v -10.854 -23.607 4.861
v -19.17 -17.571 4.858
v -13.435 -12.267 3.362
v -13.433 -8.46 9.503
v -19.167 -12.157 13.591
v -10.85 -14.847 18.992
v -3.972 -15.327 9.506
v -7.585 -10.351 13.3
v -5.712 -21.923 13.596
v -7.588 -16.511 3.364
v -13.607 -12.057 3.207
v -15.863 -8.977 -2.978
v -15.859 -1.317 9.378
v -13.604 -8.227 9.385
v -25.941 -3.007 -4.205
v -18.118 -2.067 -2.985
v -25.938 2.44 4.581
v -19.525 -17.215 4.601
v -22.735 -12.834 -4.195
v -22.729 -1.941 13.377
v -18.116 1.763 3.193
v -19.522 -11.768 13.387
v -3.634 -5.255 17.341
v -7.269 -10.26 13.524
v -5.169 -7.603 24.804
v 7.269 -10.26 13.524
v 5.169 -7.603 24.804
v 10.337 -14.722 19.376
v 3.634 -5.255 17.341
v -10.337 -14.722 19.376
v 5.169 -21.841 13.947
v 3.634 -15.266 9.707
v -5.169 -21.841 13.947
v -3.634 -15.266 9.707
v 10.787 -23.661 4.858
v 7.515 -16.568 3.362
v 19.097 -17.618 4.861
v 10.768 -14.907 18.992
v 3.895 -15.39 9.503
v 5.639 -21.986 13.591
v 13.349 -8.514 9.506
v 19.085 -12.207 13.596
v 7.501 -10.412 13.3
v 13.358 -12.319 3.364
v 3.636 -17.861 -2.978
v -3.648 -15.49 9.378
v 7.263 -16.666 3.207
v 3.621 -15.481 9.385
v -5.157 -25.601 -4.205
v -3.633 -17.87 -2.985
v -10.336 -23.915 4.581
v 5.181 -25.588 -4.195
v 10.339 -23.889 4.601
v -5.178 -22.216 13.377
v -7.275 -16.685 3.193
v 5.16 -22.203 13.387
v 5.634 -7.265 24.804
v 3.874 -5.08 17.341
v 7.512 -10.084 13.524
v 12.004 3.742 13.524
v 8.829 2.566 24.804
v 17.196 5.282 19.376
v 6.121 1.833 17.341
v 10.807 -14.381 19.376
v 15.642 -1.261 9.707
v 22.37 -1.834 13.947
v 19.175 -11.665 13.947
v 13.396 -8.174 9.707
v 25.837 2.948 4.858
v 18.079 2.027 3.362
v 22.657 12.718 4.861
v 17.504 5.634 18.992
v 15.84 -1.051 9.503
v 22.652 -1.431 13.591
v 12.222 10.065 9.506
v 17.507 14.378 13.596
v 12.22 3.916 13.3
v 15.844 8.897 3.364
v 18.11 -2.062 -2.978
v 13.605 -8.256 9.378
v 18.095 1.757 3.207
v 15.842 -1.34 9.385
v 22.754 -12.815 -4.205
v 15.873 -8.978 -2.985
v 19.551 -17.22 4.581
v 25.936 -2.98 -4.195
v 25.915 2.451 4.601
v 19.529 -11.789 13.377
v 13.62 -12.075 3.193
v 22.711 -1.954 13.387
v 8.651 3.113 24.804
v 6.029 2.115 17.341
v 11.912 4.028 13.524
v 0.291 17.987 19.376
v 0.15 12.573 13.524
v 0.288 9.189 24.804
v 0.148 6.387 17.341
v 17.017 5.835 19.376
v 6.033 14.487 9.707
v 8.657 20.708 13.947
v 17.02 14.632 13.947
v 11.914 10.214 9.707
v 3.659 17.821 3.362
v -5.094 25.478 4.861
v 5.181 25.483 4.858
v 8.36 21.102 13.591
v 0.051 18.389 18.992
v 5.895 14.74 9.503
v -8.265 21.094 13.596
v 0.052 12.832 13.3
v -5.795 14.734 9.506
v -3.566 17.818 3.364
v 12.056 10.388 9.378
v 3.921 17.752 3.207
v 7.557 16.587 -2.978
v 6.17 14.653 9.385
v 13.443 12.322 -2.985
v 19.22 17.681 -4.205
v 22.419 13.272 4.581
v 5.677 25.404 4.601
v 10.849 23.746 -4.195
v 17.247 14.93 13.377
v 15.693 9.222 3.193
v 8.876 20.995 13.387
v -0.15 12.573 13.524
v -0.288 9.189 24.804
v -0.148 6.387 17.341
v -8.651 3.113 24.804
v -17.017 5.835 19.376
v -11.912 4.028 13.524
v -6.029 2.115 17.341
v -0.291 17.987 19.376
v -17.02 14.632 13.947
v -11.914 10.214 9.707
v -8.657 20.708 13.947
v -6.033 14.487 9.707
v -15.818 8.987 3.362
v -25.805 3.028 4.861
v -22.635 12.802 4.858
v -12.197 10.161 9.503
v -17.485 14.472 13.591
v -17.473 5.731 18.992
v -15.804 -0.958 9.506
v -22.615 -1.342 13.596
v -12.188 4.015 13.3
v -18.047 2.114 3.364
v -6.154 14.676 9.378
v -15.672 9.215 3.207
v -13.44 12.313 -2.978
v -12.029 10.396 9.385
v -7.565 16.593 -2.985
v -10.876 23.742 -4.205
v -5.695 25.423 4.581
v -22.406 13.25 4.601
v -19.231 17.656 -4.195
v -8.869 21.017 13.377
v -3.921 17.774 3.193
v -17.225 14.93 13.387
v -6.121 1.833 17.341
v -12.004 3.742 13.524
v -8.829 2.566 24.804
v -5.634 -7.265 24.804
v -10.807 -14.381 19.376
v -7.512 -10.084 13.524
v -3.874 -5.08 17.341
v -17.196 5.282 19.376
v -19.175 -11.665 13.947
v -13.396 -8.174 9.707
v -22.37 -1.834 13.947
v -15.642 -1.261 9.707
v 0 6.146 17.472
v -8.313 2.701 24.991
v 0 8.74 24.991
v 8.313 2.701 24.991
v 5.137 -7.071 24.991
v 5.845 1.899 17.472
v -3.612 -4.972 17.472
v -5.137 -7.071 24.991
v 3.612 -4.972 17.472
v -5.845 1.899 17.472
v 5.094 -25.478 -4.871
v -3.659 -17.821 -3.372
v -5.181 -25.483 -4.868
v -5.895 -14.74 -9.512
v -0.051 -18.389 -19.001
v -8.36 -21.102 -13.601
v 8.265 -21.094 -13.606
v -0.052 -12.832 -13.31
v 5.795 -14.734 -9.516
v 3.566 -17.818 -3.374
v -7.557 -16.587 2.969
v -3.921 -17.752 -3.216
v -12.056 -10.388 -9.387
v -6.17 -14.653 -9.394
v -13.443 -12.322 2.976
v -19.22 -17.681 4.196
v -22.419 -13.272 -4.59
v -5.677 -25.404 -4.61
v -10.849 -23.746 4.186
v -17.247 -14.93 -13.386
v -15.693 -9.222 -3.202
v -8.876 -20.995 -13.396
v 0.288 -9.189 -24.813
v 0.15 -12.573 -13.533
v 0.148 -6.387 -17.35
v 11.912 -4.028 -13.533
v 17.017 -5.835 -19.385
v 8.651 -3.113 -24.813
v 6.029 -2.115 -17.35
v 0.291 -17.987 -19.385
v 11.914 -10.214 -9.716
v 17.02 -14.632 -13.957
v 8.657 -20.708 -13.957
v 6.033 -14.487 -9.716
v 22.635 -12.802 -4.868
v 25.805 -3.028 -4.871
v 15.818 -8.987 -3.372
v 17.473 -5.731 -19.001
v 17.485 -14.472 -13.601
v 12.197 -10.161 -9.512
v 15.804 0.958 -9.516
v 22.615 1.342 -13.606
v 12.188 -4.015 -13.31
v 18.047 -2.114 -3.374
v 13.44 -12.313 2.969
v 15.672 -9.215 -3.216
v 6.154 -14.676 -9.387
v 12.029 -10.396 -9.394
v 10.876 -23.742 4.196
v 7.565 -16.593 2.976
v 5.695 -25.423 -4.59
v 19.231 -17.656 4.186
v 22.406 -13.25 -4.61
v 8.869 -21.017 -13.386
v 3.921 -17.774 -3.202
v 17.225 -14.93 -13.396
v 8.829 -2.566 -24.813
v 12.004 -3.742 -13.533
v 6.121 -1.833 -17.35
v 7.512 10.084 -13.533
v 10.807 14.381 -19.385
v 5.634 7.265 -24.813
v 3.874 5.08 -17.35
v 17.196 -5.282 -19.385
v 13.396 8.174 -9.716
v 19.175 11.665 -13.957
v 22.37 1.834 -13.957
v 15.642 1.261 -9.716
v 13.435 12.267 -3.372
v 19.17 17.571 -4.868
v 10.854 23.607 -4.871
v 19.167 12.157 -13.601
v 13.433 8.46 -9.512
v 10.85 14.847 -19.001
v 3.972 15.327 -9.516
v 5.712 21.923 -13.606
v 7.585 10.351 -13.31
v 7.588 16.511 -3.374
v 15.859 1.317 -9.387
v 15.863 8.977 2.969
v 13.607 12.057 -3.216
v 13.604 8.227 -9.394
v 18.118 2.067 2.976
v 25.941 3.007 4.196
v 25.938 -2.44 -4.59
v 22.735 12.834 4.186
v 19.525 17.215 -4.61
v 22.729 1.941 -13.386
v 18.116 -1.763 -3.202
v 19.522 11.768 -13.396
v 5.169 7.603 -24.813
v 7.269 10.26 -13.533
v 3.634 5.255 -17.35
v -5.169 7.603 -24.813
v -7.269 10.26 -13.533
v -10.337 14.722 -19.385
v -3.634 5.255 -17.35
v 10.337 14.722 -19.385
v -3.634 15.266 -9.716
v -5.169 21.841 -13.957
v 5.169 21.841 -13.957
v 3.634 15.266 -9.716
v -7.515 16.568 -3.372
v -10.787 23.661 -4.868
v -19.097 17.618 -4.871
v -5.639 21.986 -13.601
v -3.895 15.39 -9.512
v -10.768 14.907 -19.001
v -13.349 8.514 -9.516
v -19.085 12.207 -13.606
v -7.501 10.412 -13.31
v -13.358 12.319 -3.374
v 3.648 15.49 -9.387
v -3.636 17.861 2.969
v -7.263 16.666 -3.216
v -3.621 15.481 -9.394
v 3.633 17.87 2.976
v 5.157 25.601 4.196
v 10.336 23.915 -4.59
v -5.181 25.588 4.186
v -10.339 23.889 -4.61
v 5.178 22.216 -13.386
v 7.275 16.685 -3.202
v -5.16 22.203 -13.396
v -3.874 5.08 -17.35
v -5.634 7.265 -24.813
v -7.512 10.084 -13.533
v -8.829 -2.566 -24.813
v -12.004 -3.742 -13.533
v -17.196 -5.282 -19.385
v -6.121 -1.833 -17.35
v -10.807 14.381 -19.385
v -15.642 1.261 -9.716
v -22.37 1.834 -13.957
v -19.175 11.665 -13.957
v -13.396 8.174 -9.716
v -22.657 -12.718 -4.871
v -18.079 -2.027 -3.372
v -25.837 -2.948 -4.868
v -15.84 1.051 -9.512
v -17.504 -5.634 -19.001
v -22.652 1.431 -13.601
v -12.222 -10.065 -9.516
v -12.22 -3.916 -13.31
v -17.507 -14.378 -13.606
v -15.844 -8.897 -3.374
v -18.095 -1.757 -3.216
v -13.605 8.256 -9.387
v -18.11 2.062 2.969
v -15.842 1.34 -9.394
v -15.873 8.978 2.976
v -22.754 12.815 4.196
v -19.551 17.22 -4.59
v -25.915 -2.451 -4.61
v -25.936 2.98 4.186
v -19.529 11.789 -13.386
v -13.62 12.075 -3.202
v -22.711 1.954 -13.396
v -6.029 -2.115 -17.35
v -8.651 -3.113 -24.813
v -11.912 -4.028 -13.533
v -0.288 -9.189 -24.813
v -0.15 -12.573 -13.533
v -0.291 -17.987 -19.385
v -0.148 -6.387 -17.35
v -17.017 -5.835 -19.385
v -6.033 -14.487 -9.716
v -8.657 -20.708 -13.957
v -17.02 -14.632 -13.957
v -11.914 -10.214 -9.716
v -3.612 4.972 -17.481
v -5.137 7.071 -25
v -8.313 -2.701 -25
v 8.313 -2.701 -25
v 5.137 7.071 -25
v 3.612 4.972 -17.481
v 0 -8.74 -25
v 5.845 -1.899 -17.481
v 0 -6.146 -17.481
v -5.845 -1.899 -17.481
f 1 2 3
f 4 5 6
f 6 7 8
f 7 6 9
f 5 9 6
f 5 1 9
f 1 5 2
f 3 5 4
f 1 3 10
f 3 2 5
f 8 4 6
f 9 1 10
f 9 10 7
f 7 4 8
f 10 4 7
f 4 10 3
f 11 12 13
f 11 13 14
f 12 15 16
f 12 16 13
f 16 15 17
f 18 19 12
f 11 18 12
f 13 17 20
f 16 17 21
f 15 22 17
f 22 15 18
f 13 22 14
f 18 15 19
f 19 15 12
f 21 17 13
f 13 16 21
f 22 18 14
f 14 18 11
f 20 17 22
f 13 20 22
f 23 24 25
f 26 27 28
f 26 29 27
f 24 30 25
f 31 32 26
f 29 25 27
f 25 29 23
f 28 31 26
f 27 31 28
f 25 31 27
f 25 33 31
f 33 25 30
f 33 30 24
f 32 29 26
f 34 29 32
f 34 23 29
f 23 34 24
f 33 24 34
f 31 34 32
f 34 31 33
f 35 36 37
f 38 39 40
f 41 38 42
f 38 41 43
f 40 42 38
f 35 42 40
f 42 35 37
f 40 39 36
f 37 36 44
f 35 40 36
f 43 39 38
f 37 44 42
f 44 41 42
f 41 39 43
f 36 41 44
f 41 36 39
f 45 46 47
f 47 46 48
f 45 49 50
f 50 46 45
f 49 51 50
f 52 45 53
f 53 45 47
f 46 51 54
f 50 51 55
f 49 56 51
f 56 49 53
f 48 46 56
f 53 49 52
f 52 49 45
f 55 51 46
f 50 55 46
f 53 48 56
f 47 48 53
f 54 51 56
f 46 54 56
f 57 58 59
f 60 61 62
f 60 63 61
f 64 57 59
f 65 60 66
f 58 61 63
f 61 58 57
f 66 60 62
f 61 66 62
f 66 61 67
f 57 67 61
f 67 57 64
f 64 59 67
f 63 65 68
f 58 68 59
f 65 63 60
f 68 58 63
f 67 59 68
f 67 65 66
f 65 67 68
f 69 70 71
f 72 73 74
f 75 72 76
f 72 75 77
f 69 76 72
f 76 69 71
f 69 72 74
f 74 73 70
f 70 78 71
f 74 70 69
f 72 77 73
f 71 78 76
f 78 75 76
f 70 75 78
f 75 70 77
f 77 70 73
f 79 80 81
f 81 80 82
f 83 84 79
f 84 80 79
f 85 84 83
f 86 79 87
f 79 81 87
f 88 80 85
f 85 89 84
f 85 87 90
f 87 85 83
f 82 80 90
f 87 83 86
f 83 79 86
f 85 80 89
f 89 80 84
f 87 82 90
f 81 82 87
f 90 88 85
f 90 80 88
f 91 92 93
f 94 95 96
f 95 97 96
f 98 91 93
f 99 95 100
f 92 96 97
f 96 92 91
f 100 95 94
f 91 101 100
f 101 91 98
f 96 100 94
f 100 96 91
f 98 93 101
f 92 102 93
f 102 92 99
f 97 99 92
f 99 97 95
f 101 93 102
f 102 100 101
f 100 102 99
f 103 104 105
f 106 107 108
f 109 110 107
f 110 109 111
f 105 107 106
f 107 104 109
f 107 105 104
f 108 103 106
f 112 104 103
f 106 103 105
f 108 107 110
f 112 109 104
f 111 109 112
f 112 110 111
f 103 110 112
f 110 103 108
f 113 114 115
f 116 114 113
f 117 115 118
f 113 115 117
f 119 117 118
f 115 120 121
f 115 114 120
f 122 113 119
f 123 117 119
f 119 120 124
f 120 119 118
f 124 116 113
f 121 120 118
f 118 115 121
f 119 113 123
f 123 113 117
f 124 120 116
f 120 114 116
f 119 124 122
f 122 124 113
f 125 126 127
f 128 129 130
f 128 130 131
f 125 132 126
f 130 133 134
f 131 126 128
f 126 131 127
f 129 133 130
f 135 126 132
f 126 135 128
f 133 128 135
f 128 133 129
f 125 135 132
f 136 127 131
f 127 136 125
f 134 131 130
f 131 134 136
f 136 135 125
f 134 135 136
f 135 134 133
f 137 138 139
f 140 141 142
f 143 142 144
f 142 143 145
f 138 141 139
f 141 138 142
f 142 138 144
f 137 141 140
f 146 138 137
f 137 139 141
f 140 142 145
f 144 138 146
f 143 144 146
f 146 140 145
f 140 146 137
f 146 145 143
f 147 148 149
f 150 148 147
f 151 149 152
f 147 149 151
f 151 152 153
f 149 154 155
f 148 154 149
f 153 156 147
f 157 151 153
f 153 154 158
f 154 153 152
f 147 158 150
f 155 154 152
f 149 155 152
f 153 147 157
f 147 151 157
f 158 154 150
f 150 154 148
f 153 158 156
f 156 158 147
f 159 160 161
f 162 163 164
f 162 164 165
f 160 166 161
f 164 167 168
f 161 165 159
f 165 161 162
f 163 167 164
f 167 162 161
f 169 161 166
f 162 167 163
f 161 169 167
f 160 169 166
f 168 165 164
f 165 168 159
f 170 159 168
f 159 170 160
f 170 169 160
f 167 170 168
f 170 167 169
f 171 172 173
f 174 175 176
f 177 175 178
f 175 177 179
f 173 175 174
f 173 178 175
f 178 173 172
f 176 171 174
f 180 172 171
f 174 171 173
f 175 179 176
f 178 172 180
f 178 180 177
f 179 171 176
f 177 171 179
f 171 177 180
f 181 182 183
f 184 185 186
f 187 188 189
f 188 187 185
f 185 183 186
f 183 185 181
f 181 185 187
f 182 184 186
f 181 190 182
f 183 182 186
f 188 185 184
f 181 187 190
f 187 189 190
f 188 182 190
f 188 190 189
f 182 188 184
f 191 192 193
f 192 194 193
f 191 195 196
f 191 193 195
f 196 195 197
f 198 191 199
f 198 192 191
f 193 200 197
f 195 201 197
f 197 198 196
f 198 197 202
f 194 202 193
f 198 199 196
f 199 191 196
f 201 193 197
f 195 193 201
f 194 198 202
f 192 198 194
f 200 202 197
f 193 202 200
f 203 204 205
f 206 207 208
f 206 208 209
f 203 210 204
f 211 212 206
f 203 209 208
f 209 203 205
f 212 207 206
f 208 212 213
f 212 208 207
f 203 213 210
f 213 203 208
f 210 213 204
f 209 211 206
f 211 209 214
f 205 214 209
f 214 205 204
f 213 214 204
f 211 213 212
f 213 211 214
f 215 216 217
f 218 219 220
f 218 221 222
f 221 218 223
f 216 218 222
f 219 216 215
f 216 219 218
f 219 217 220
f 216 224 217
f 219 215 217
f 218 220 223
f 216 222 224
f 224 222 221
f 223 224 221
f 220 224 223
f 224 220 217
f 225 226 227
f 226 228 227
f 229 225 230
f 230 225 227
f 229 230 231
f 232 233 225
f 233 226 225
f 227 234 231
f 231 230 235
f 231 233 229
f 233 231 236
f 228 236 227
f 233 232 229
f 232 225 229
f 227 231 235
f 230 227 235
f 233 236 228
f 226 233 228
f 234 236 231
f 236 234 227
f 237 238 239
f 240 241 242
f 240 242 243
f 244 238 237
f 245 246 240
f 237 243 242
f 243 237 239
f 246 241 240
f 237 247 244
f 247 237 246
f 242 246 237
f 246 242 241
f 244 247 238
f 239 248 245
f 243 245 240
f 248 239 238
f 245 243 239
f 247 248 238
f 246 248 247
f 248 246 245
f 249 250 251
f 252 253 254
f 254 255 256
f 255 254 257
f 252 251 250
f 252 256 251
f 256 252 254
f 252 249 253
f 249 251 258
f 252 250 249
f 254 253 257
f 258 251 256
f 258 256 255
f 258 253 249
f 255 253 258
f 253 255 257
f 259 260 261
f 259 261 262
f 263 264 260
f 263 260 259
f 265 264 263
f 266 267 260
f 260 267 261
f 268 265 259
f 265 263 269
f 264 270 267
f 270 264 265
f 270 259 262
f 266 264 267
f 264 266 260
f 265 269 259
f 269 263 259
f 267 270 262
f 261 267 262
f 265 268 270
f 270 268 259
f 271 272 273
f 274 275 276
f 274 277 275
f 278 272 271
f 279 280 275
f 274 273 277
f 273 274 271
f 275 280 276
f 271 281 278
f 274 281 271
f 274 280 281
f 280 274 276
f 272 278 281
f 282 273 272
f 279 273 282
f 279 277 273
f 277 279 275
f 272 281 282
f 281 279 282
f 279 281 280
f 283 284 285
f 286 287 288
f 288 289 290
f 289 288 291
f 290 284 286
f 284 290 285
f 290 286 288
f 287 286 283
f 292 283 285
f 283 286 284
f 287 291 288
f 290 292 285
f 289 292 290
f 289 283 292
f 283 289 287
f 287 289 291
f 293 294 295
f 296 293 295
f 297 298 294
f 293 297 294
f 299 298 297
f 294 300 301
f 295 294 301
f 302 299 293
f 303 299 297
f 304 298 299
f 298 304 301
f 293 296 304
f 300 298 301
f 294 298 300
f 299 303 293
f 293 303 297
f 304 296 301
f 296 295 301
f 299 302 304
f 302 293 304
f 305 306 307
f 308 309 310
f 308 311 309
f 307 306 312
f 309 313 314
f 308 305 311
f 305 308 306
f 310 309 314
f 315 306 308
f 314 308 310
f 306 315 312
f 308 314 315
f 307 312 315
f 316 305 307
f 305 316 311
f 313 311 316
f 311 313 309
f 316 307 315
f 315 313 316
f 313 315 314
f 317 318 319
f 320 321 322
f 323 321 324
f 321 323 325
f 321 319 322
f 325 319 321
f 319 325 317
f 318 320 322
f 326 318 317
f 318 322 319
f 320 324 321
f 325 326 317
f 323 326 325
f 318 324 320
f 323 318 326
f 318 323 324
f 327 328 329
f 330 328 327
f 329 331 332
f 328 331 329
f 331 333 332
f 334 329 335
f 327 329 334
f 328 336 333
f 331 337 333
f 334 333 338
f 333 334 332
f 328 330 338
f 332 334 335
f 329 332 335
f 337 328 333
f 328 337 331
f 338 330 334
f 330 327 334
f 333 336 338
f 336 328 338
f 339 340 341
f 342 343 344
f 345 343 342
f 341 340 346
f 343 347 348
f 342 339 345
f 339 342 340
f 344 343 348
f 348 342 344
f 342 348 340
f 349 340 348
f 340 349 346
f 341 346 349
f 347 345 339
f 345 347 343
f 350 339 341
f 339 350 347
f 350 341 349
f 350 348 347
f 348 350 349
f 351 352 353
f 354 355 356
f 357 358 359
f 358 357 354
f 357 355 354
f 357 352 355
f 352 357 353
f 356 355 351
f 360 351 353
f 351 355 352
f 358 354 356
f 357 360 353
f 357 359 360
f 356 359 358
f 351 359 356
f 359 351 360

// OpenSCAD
height = 50; 
spacing = 0.5;

// create a pentagon by length.
// Parameters:
//     length : the side length
//     spacing : the gap between a pentagon or a hexagon
module pentagon(length, spacing = 0.5) {
    r = 0.5 * length / sin(36);
	s = (r - spacing / 2) / r;

    color("black") 
	    rotate(18) 		     
		     linear_extrude(length, scale = 1.42215)
		        scale([s, s, s])
			        circle(0.5 * length / sin(36), $fn = 5);
}

// create a hexagon by length.
// Parameters:
//     length : the side length
//     spacing : the gap between a pentagon or a hexagon
module hexagon(length, spacing = 0.5) {
    r = 0.5 * length / sin(30);
	s = (r - spacing / 2) / r;

    color("white") 
	     linear_extrude(length - length * 0.02125, scale = 1.42215) 
		    scale([s, s, s])			
		        circle(0.5 * length / sin(30), $fn = 6);
}

// a placeholder pentagon, one pentagon and two hexagons.
// Parameters:
//     length : the side length
//     spacing : the gap between the pentagon and hexagon
module pentagon_based_sub_comp(length, spacing = 0.5) {
	pentagon_circle_r = 0.5 * length / sin(36);
	
	a = 37.325;
	
	offset_y = 0.5 * length * tan(54) + pentagon_circle_r * cos(a);
	offset_z = 0.5 * length * tan(60) * sin(a);
	
	translate([0, -offset_y, -offset_z]) 
	    rotate([a, 0, 0]) 
		    hexagon_based_sub_comp(length, spacing);
}


// two hexagons and one pentagon.
// Parameters:
//     length : the side length
//     spacing : the gap between the pentagon and hexagon
module hexagon_based_sub_comp(length, spacing = 0.5) {
    hexagon(length, spacing);
	
	length_center_to_side = 0.5 * length * tan(54);
	
    a = -37.325;
	
	offset_y = 0.5 * length * (tan(54) * cos(a) + tan(60));
	offset_z = length_center_to_side * sin(a);
	
	rotate(120) translate([0, offset_y, offset_z]) 
	    rotate([a, 0, 0]) 
	        pentagon_hexagon(length, spacing);
			
}

// a pentagon and a hexagon.
// Parameters:
//     length : the side length
//     spacing : the gap between the pentagon and hexagon
module pentagon_hexagon(length, spacing = 0.5) {
	pentagon_circle_r = 0.5 * length / sin(36);
	
	pentagon(length, spacing);
	
	a = 37.325;
	
	offset_y = 0.5 * length * tan(54) + pentagon_circle_r * cos(a);
	offset_z = 0.5 * length * tan(60) * sin(a);
	
	rotate(144) translate([0, -offset_y, -offset_z]) 
	    rotate([a, 0, 0]) 
		    hexagon(length, spacing);
}

// a half of soccer polyhedron.
// Parameters:
//     line_length : the side length of pentagons and hexagons
//     spacing : the gap between the pentagon and hexagon
module half_soccer_polyhedron(line_length, spacing = 0.5) {
	pentagon_circle_r = 0.5 * line_length / sin(36);
	offset_y = pentagon_circle_r * cos(36);

	pentagon(line_length, spacing);
	
	for(i = [0:4]) {
		rotate(72 * i) 
		    pentagon_based_sub_comp(line_length, spacing);
	}
}

// a soccer polyhedron.
// Parameters:
//     line_length : the side length of pentagons and hexagons
//     spacing : the gap between the pentagon and hexagon
//     center : center it or not
module soccer_polyhedron(height, spacing = 0.5, center = true) {
    line_length = height / 6.65;
	
	offset_for_center = center ? height / 2: 0;
	
	translate([0, 0, -offset_for_center]) union() {
		translate([0, 0, -line_length + line_length * 6.64875]) 
		    half_soccer_polyhedron(line_length, spacing);
			
		rotate(36) mirror([0, 0, 1]) translate([0, 0, -line_length]) 
		    half_soccer_polyhedron(line_length, spacing);
	}
}

soccer_polyhedron(height, spacing); 
